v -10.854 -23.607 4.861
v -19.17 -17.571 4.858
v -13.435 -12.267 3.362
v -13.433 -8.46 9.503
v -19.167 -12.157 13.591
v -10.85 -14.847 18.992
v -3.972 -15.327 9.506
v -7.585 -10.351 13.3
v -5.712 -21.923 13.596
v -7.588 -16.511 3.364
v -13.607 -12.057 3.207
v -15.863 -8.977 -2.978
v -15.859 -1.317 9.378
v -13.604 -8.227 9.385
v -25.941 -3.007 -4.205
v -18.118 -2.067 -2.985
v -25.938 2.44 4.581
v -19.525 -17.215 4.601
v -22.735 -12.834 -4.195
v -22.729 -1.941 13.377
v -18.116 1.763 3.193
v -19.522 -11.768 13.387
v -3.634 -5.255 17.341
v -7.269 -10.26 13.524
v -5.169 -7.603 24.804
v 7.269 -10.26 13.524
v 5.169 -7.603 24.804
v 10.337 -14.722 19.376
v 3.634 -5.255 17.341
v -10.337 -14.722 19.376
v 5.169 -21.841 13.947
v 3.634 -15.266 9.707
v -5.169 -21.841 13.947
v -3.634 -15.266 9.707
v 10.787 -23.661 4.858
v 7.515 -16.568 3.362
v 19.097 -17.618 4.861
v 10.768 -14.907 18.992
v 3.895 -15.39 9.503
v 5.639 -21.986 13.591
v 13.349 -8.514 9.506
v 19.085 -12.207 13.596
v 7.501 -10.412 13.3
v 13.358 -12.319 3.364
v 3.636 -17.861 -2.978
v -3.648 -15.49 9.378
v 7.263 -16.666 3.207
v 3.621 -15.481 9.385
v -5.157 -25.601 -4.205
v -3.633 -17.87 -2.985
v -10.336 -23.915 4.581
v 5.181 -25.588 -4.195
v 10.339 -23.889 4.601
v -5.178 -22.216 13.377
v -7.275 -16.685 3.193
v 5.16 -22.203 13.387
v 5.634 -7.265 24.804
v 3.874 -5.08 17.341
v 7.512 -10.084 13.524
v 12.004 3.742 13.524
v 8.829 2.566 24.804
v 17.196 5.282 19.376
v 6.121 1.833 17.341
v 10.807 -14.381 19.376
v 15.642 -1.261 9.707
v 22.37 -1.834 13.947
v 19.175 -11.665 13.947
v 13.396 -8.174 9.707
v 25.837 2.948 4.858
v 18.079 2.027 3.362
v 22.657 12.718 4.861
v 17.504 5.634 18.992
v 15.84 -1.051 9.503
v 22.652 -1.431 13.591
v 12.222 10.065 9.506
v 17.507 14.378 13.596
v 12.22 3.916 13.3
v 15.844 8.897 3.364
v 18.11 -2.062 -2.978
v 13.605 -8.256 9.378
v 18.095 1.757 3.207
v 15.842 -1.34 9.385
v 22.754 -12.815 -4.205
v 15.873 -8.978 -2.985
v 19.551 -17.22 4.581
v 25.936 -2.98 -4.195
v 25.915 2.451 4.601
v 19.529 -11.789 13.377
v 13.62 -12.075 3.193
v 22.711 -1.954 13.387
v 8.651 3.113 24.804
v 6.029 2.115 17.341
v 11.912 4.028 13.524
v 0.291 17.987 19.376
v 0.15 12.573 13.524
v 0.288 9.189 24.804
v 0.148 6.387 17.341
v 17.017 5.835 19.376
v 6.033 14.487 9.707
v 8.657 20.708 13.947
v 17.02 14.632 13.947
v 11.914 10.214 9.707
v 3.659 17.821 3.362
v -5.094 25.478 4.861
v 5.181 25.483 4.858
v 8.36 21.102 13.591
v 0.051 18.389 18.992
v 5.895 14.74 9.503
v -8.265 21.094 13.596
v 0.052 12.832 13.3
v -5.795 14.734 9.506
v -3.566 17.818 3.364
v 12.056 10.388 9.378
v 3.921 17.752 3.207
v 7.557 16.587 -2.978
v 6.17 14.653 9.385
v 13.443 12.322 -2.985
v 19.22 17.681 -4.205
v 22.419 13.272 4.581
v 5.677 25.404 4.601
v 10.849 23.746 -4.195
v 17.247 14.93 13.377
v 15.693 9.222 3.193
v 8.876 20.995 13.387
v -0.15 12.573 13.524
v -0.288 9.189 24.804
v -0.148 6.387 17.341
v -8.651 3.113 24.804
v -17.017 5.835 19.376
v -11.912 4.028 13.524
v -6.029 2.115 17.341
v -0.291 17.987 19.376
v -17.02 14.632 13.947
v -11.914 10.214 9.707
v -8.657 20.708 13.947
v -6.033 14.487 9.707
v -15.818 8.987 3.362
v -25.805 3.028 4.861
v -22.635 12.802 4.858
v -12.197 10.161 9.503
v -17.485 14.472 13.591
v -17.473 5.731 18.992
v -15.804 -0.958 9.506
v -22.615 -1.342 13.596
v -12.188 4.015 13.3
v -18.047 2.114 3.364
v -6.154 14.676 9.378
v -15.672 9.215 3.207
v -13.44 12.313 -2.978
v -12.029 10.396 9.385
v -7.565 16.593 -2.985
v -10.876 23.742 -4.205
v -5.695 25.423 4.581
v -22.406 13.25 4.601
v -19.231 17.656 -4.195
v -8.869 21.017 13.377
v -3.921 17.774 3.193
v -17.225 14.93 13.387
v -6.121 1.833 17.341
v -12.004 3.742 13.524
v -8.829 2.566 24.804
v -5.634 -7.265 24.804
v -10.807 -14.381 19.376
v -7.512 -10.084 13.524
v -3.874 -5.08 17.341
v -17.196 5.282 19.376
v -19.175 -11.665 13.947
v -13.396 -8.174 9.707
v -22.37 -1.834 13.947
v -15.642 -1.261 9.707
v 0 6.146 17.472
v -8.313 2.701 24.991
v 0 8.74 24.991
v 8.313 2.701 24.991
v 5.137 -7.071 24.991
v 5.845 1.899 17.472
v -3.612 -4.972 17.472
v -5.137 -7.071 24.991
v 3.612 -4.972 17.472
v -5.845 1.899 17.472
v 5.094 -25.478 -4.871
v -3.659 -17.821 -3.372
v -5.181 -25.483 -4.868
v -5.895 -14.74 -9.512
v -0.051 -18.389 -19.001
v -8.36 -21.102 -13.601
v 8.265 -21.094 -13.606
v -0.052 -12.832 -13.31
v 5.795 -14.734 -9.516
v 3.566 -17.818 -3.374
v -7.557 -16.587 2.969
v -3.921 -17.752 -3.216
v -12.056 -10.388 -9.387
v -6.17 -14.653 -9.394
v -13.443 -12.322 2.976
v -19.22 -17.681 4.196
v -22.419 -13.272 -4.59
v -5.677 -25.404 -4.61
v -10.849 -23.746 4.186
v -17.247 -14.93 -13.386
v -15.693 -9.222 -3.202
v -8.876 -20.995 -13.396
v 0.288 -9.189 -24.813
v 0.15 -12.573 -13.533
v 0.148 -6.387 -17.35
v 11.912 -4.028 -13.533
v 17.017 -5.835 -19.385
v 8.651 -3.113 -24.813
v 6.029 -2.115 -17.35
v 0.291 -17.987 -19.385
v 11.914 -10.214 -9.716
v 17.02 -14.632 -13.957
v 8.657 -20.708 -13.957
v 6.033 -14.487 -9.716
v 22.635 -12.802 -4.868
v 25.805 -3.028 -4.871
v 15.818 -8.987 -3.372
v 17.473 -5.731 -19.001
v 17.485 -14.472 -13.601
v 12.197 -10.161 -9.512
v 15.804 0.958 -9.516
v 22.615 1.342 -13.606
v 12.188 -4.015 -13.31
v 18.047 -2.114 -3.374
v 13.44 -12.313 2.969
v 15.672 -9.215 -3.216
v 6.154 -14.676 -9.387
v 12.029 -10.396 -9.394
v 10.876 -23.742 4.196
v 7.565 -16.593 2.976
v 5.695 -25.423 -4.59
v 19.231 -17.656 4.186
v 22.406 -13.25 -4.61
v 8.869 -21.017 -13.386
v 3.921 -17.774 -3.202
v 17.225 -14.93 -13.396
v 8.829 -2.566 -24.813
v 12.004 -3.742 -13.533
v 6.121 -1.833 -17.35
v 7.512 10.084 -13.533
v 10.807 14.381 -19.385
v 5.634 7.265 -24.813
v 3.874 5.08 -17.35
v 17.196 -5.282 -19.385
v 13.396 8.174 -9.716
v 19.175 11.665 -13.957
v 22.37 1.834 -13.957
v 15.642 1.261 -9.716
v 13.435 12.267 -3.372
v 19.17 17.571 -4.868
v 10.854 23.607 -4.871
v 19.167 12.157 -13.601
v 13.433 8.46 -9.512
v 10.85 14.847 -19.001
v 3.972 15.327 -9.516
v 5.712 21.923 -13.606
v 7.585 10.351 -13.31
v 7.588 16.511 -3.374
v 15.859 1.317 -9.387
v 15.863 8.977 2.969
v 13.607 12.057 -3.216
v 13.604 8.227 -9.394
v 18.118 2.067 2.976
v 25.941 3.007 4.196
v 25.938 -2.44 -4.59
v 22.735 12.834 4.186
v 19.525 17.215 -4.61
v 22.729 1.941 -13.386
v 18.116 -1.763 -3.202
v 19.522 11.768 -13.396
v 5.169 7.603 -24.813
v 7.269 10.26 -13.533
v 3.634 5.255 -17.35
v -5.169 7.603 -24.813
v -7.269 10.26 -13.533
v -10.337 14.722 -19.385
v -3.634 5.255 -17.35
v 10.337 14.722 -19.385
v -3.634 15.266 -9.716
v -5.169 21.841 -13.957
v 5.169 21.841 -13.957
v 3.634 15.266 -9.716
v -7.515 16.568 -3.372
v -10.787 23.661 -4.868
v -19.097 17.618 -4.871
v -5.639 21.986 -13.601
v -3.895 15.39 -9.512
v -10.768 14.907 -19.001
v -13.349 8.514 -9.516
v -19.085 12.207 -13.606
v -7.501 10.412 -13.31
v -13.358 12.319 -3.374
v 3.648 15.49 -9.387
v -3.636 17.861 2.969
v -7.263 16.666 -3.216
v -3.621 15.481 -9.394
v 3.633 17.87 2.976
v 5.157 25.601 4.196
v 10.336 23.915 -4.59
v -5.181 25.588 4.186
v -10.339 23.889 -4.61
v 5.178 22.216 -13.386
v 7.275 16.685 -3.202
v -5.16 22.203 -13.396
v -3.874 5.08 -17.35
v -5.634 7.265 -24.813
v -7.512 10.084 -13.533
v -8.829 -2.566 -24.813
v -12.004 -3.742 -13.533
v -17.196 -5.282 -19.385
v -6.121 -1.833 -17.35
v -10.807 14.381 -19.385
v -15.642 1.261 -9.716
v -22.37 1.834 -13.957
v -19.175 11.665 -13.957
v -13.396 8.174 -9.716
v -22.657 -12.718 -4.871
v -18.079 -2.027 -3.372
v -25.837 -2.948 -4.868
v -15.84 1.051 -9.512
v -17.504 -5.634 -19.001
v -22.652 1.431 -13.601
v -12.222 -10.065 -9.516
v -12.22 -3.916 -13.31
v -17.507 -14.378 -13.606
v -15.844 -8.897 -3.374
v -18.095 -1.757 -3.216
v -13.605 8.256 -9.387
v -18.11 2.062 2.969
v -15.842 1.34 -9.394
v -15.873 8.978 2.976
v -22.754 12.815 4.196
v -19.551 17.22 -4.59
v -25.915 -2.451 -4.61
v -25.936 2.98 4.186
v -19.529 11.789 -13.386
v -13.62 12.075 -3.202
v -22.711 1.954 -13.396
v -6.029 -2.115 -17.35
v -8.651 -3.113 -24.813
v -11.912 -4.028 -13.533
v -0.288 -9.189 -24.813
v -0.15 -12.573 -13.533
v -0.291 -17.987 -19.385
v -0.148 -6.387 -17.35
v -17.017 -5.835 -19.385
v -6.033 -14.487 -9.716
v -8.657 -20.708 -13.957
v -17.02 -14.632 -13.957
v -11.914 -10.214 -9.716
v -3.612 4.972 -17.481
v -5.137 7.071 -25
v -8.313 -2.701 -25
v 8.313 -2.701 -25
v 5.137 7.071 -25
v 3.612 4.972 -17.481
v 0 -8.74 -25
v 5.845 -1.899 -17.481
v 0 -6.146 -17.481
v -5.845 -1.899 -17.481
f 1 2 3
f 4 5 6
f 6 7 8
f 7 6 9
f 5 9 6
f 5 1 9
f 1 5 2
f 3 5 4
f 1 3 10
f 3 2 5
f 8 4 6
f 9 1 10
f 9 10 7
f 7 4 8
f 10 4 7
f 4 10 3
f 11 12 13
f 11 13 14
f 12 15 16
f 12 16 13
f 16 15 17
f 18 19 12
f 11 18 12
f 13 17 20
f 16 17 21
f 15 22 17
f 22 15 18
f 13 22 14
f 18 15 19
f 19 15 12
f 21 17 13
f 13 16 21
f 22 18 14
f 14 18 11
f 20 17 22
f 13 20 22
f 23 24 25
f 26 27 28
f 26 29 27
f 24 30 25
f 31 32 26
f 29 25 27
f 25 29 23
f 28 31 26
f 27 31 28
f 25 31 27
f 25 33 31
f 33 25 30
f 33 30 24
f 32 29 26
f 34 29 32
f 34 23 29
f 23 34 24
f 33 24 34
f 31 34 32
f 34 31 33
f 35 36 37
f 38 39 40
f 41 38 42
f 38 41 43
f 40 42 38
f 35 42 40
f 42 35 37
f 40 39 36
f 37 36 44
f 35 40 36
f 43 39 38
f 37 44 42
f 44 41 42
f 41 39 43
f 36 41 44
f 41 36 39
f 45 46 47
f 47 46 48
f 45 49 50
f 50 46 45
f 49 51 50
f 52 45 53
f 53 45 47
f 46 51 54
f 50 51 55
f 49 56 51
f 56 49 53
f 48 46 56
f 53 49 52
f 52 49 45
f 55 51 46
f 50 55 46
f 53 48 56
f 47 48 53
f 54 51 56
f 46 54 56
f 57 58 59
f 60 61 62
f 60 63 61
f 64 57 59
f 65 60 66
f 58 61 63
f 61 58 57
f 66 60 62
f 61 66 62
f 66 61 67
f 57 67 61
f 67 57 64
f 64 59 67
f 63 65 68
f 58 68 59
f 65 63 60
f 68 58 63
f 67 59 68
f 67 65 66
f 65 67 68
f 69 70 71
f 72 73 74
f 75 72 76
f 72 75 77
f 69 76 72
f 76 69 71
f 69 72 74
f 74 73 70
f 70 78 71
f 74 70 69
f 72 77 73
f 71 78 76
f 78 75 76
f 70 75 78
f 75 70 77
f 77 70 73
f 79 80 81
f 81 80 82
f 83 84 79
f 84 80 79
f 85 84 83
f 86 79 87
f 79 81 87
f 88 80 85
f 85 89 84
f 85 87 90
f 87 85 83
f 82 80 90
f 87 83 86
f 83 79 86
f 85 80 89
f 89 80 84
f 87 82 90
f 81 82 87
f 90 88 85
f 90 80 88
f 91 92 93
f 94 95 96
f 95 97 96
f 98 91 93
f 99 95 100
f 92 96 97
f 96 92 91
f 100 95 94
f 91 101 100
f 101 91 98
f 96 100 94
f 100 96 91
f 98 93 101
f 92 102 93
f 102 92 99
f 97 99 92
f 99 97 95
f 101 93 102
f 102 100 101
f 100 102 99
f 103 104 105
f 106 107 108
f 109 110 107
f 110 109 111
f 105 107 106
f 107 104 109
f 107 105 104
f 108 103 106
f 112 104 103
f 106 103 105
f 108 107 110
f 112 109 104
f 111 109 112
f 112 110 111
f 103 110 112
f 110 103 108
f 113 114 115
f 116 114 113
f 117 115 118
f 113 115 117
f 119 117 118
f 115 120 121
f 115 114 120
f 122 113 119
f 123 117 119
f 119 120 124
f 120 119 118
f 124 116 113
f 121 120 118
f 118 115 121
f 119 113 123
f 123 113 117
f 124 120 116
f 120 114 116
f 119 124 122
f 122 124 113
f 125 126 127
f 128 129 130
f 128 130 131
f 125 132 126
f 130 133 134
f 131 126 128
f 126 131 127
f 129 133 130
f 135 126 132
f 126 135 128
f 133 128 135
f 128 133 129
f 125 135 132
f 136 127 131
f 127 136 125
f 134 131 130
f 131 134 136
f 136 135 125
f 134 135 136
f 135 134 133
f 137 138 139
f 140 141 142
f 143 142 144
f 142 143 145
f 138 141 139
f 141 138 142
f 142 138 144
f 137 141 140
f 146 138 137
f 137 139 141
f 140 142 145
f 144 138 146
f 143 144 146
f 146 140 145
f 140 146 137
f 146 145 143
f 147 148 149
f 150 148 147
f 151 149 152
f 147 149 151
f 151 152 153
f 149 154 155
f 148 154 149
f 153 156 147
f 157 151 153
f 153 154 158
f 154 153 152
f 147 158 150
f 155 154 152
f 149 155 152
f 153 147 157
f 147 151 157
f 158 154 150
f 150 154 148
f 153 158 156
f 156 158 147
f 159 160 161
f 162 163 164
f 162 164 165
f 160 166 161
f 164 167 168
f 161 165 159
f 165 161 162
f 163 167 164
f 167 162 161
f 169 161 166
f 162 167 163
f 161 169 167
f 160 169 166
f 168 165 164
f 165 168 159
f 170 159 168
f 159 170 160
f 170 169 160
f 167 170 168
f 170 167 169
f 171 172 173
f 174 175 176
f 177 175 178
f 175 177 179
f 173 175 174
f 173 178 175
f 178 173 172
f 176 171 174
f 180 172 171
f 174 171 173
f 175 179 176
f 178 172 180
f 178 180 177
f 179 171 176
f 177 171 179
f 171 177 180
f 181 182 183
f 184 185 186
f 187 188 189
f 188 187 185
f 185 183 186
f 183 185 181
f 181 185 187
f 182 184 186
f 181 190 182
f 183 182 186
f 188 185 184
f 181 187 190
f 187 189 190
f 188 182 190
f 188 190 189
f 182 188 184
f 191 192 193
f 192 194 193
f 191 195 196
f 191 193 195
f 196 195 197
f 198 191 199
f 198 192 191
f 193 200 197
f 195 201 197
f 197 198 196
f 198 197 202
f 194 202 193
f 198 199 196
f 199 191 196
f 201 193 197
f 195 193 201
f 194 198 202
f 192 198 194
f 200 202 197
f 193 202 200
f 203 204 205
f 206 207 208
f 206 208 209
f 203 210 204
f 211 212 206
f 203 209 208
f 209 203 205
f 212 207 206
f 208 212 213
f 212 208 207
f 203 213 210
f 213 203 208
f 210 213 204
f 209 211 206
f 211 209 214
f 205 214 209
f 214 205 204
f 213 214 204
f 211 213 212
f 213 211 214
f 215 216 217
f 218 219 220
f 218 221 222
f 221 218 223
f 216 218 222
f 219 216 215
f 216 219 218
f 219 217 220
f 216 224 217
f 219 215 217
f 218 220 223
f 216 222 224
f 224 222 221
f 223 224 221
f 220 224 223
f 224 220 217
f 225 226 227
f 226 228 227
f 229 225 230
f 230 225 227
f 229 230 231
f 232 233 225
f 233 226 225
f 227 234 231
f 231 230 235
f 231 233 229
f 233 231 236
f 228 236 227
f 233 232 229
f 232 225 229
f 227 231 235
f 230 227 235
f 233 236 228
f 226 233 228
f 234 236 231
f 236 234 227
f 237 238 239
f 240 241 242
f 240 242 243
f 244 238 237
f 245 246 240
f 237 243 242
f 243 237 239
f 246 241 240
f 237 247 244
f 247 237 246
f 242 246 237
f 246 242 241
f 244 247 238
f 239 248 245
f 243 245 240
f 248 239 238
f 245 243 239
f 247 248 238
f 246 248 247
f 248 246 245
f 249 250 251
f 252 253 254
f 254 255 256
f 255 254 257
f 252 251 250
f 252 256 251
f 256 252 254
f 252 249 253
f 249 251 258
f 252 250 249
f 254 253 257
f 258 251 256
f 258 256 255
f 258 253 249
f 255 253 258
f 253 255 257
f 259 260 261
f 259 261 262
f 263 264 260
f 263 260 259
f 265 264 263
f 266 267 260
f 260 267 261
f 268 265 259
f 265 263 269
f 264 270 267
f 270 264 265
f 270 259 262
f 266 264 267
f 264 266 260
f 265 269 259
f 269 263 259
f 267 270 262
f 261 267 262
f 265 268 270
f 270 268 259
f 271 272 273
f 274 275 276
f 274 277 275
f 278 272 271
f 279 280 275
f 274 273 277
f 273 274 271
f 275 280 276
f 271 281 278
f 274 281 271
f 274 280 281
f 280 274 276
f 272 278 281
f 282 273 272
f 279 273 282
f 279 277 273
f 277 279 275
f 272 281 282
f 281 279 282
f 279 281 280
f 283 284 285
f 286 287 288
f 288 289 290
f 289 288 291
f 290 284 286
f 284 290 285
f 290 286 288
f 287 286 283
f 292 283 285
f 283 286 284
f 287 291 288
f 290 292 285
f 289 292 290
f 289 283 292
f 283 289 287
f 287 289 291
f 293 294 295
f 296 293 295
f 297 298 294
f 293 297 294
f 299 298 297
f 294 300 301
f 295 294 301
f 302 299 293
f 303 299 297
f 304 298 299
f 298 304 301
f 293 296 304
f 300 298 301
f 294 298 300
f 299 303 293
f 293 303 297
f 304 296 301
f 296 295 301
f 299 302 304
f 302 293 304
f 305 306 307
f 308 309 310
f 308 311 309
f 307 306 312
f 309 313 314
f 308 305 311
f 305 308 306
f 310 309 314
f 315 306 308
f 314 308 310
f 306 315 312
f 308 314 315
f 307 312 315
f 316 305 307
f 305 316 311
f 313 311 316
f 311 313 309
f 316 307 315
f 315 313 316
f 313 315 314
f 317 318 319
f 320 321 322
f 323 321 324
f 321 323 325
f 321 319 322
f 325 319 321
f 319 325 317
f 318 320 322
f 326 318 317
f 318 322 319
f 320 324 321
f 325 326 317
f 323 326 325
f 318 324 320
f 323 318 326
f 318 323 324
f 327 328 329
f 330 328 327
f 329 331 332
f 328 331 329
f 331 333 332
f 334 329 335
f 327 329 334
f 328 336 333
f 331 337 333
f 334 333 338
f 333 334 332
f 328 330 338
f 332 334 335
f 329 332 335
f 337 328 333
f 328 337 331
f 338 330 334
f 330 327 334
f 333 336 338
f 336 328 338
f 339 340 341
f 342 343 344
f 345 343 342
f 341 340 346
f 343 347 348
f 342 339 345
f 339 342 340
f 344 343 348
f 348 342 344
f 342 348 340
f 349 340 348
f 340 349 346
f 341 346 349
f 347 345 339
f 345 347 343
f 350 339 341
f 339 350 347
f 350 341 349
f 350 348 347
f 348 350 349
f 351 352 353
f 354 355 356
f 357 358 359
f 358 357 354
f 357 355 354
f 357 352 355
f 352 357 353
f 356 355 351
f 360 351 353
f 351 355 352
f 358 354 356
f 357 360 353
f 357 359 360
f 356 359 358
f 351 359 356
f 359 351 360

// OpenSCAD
height = 50; 
spacing = 0.5;

// create a pentagon by length.
// Parameters:
//     length : the side length
//     spacing : the gap between a pentagon or a hexagon
module pentagon(length, spacing = 0.5) {
    r = 0.5 * length / sin(36);
	s = (r - spacing / 2) / r;

    color("black") 
	    rotate(18) 		     
		     linear_extrude(length, scale = 1.42215)
		        scale([s, s, s])
			        circle(0.5 * length / sin(36), $fn = 5);
}

// create a hexagon by length.
// Parameters:
//     length : the side length
//     spacing : the gap between a pentagon or a hexagon
module hexagon(length, spacing = 0.5) {
    r = 0.5 * length / sin(30);
	s = (r - spacing / 2) / r;

    color("white") 
	     linear_extrude(length - length * 0.02125, scale = 1.42215) 
		    scale([s, s, s])			
		        circle(0.5 * length / sin(30), $fn = 6);
}

// a placeholder pentagon, one pentagon and two hexagons.
// Parameters:
//     length : the side length
//     spacing : the gap between the pentagon and hexagon
module pentagon_based_sub_comp(length, spacing = 0.5) {
	pentagon_circle_r = 0.5 * length / sin(36);
	
	a = 37.325;
	
	offset_y = 0.5 * length * tan(54) + pentagon_circle_r * cos(a);
	offset_z = 0.5 * length * tan(60) * sin(a);
	
	translate([0, -offset_y, -offset_z]) 
	    rotate([a, 0, 0]) 
		    hexagon_based_sub_comp(length, spacing);
}


// two hexagons and one pentagon.
// Parameters:
//     length : the side length
//     spacing : the gap between the pentagon and hexagon
module hexagon_based_sub_comp(length, spacing = 0.5) {
    hexagon(length, spacing);
	
	length_center_to_side = 0.5 * length * tan(54);
	
    a = -37.325;
	
	offset_y = 0.5 * length * (tan(54) * cos(a) + tan(60));
	offset_z = length_center_to_side * sin(a);
	
	rotate(120) translate([0, offset_y, offset_z]) 
	    rotate([a, 0, 0]) 
	        pentagon_hexagon(length, spacing);
			
}

// a pentagon and a hexagon.
// Parameters:
//     length : the side length
//     spacing : the gap between the pentagon and hexagon
module pentagon_hexagon(length, spacing = 0.5) {
	pentagon_circle_r = 0.5 * length / sin(36);
	
	pentagon(length, spacing);
	
	a = 37.325;
	
	offset_y = 0.5 * length * tan(54) + pentagon_circle_r * cos(a);
	offset_z = 0.5 * length * tan(60) * sin(a);
	
	rotate(144) translate([0, -offset_y, -offset_z]) 
	    rotate([a, 0, 0]) 
		    hexagon(length, spacing);
}

// a half of soccer polyhedron.
// Parameters:
//     line_length : the side length of pentagons and hexagons
//     spacing : the gap between the pentagon and hexagon
module half_soccer_polyhedron(line_length, spacing = 0.5) {
	pentagon_circle_r = 0.5 * line_length / sin(36);
	offset_y = pentagon_circle_r * cos(36);

	pentagon(line_length, spacing);
	
	for(i = [0:4]) {
		rotate(72 * i) 
		    pentagon_based_sub_comp(line_length, spacing);
	}
}

// a soccer polyhedron.
// Parameters:
//     line_length : the side length of pentagons and hexagons
//     spacing : the gap between the pentagon and hexagon
//     center : center it or not
module soccer_polyhedron(height, spacing = 0.5, center = true) {
    line_length = height / 6.65;
	
	offset_for_center = center ? height / 2: 0;
	
	translate([0, 0, -offset_for_center]) union() {
		translate([0, 0, -line_length + line_length * 6.64875]) 
		    half_soccer_polyhedron(line_length, spacing);
			
		rotate(36) mirror([0, 0, 1]) translate([0, 0, -line_length]) 
		    half_soccer_polyhedron(line_length, spacing);
	}
}

soccer_polyhedron(height, spacing); 
